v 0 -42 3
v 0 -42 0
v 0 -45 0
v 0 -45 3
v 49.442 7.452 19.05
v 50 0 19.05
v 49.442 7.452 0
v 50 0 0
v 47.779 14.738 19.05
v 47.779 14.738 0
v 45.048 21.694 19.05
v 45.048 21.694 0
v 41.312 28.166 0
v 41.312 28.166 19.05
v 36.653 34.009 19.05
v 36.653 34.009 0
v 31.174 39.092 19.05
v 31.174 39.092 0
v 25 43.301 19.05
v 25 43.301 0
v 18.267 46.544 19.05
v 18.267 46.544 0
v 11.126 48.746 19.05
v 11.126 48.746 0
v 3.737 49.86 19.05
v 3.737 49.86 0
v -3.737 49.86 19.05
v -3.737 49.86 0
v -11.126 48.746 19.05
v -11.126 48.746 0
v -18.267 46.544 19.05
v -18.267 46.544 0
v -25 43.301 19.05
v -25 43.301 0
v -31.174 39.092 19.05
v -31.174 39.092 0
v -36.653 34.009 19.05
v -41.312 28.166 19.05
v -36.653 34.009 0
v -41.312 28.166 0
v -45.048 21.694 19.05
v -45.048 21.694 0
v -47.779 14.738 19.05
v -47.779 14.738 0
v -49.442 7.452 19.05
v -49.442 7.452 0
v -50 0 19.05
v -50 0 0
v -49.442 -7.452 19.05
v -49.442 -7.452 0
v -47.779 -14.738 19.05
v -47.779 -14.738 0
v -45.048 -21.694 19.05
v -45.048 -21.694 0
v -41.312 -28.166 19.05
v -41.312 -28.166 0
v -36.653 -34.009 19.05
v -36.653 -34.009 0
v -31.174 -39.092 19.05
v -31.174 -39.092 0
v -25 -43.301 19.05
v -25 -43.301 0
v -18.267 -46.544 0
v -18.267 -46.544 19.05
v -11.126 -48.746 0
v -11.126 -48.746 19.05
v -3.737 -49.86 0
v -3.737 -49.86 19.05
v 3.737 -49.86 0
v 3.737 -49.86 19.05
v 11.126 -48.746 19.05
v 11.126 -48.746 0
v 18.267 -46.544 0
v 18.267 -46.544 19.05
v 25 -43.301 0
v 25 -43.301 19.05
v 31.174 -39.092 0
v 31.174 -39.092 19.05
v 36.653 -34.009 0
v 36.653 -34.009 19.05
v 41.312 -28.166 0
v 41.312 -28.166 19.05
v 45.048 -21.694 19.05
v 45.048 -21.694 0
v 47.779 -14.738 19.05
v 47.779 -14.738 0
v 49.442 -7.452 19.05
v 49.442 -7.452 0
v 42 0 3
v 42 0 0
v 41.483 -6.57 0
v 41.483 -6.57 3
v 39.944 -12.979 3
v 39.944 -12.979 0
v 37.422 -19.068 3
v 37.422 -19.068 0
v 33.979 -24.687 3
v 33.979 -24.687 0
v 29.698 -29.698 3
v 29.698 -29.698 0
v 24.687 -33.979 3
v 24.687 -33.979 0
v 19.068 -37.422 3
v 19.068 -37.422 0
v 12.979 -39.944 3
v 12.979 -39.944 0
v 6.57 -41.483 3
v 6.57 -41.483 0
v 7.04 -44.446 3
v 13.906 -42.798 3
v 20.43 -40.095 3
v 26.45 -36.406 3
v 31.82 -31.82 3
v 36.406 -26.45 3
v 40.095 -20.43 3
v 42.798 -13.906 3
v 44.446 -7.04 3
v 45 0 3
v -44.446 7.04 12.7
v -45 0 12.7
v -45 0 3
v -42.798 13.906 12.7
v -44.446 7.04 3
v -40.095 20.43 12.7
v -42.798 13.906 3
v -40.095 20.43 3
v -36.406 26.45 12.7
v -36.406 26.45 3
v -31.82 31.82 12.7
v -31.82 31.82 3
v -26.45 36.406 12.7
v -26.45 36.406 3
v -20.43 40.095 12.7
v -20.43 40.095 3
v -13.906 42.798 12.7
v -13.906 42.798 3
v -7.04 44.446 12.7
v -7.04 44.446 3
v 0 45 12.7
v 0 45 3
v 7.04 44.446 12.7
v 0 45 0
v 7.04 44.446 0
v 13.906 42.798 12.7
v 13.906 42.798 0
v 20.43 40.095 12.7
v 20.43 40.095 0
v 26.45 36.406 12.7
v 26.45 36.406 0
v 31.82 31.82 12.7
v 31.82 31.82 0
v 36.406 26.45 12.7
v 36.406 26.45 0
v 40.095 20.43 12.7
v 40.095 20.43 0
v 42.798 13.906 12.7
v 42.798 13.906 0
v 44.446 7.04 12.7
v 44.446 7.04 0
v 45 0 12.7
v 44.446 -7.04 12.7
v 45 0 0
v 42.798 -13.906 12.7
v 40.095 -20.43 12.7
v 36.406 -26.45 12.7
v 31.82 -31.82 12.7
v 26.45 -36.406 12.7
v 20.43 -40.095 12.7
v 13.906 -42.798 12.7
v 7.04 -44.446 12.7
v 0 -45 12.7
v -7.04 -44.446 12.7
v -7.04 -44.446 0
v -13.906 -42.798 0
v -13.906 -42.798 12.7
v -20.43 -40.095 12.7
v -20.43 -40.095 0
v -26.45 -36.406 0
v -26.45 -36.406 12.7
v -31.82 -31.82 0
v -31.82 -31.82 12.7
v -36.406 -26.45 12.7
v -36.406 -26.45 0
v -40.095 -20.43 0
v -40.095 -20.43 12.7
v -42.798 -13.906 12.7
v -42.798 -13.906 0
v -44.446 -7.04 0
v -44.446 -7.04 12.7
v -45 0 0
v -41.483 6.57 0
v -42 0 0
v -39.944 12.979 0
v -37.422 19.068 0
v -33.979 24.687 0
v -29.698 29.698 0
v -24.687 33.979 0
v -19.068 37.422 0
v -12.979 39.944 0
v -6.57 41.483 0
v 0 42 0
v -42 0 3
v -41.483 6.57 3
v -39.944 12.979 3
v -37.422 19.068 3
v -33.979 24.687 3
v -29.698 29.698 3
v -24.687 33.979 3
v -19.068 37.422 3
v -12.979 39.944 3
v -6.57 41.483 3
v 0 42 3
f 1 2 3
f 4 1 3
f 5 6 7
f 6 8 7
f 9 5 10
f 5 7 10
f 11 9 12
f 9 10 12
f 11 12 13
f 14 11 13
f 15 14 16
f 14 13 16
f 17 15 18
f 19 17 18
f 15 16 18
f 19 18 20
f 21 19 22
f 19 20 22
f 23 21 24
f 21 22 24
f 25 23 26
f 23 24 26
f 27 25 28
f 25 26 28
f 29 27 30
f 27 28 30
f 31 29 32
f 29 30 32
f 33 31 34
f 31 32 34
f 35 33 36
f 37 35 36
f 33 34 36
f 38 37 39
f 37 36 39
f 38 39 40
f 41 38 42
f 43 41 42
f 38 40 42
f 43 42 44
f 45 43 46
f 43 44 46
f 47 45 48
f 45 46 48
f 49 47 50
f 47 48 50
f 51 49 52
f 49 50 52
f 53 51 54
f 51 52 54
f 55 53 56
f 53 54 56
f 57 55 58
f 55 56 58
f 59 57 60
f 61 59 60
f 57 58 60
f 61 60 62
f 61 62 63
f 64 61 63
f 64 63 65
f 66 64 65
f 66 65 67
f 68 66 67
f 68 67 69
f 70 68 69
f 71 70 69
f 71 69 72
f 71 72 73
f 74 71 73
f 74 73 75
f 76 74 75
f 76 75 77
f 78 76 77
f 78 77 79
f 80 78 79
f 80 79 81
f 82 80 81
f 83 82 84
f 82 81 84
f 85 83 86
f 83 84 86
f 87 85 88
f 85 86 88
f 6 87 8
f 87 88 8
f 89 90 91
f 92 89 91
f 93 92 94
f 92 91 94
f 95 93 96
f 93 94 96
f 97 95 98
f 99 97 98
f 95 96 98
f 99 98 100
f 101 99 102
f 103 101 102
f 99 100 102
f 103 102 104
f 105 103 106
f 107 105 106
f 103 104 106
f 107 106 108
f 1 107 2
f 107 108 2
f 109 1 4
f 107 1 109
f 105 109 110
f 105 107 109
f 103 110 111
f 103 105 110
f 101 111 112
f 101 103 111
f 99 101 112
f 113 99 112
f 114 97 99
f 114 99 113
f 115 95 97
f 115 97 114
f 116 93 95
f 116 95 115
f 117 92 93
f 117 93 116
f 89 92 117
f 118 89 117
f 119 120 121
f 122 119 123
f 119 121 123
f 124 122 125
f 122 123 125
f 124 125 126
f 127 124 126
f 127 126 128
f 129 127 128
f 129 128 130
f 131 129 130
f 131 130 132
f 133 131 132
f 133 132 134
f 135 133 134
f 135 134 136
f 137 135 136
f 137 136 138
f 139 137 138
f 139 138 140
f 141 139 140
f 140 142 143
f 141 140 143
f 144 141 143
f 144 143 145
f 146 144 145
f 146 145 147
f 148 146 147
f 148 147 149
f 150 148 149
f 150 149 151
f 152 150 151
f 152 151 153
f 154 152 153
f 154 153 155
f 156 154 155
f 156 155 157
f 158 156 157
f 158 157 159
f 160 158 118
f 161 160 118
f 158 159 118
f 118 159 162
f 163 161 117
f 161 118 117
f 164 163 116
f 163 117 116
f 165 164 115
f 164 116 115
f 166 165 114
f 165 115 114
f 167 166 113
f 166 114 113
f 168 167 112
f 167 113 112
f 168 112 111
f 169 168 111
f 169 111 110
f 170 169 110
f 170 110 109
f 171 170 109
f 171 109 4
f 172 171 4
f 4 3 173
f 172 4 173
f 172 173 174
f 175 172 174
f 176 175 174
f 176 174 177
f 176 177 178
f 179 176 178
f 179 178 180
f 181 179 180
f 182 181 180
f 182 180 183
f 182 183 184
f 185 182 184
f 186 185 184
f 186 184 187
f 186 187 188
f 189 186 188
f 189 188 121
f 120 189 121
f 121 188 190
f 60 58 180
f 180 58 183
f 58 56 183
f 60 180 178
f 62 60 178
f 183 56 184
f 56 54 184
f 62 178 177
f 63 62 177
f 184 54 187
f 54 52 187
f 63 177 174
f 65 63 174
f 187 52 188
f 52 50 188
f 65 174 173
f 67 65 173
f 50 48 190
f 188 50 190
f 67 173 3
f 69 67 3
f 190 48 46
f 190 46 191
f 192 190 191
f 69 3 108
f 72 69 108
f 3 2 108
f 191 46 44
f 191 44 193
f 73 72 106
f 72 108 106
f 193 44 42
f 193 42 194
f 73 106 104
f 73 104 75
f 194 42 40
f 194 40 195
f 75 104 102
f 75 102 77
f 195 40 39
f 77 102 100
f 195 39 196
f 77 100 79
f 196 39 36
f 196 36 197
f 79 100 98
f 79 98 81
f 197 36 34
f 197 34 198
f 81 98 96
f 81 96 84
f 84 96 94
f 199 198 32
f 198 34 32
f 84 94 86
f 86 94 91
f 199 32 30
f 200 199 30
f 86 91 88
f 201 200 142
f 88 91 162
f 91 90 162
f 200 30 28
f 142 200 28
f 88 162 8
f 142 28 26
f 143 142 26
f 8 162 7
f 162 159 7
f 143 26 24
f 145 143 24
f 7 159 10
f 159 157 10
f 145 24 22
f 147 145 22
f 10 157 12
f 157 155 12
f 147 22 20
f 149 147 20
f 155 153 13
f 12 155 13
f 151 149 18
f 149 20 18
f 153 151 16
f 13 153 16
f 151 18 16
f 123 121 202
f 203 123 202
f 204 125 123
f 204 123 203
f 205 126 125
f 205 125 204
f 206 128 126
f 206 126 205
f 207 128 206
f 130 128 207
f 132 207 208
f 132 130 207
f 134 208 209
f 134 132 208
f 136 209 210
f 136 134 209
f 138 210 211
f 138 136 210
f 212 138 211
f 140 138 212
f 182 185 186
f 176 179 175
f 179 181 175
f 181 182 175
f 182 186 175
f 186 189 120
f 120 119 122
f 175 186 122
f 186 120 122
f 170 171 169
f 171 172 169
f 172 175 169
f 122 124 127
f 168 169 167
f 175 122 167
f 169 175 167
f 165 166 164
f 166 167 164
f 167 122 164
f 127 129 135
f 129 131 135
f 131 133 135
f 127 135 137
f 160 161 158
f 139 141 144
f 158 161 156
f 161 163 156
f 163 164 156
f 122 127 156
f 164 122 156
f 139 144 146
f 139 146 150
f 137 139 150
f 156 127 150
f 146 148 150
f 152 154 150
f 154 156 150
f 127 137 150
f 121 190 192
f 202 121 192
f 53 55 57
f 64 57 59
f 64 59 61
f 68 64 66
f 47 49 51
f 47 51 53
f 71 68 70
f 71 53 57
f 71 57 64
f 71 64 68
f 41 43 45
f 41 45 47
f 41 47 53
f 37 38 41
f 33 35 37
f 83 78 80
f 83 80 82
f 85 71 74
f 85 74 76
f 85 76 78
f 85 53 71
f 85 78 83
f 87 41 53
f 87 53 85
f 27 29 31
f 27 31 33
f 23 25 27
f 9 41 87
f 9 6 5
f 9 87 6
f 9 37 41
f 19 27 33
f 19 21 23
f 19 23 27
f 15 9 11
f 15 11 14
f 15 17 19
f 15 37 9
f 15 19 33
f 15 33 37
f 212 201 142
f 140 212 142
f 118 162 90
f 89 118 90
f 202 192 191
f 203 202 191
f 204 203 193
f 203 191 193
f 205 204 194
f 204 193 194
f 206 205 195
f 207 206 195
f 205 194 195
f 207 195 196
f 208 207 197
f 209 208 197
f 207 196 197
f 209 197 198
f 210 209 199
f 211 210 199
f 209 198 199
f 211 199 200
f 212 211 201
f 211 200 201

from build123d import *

# Parameters (mm, degrees)
F3_DEPTH = 3
F2_R     = 50
F4_DEPTH = 12.7
F5_R     = 50
F5_R_2   = 45
F6_DEPTH = 6.35


with BuildPart() as f3:
    # F2 (on Top) → F3 (new body)
    with BuildSketch(Plane.XY):
        with BuildLine():
            Line((0, 42), (0, 45))
            ThreePointArc((0, 45), (-31.8198051534, 31.8198051534), (-45, 0))
            Line((-45, 0), (-42, 0))
            ThreePointArc((-42, 0), (-29.6984848098, 29.6984848098), (0, 42))
        make_face()
    extrude(amount=F3_DEPTH)



with BuildPart() as f3b:
    # F2 (on Top) → F3, piece 2 (new body)
    with BuildSketch(Plane.XY):
        with BuildLine():
            ThreePointArc((0, -45), (31.8198051534, -31.8198051534), (45, 0))
            Line((45, 0), (42, 0))
            ThreePointArc((42, 0), (29.6984848098, -29.6984848098), (0, -42))
            Line((0, -42), (0, -45))
        make_face()
    extrude(amount=F3_DEPTH)


with BuildPart() as f3_1:
    add(f3.part)

    add(f3b.part)  # F4 merges F3b
    # F2 (on Top) → F4 (join)
    with BuildSketch(Plane.XY):
        Circle(F2_R)
        with BuildLine():
            ThreePointArc((0, 45), (31.8198051534, 31.8198051534), (45, 0))
            ThreePointArc((45, 0), (31.8198051534, -31.8198051534), (0, -45))
            ThreePointArc((0, -45), (-31.8198051534, -31.8198051534), (-45, 0))
            ThreePointArc((-45, 0), (-31.8198051534, 31.8198051534), (0, 45))
        make_face(mode=Mode.SUBTRACT)
    extrude(amount=F4_DEPTH)

    # F5 (on face) → F6 (join)
    with BuildSketch(Plane.XY.offset(12.7)):
        Circle(F5_R)
        Circle(F5_R_2, mode=Mode.SUBTRACT)
        Circle(F5_R_2)
    extrude(amount=F6_DEPTH)


solid = f3_1.part
